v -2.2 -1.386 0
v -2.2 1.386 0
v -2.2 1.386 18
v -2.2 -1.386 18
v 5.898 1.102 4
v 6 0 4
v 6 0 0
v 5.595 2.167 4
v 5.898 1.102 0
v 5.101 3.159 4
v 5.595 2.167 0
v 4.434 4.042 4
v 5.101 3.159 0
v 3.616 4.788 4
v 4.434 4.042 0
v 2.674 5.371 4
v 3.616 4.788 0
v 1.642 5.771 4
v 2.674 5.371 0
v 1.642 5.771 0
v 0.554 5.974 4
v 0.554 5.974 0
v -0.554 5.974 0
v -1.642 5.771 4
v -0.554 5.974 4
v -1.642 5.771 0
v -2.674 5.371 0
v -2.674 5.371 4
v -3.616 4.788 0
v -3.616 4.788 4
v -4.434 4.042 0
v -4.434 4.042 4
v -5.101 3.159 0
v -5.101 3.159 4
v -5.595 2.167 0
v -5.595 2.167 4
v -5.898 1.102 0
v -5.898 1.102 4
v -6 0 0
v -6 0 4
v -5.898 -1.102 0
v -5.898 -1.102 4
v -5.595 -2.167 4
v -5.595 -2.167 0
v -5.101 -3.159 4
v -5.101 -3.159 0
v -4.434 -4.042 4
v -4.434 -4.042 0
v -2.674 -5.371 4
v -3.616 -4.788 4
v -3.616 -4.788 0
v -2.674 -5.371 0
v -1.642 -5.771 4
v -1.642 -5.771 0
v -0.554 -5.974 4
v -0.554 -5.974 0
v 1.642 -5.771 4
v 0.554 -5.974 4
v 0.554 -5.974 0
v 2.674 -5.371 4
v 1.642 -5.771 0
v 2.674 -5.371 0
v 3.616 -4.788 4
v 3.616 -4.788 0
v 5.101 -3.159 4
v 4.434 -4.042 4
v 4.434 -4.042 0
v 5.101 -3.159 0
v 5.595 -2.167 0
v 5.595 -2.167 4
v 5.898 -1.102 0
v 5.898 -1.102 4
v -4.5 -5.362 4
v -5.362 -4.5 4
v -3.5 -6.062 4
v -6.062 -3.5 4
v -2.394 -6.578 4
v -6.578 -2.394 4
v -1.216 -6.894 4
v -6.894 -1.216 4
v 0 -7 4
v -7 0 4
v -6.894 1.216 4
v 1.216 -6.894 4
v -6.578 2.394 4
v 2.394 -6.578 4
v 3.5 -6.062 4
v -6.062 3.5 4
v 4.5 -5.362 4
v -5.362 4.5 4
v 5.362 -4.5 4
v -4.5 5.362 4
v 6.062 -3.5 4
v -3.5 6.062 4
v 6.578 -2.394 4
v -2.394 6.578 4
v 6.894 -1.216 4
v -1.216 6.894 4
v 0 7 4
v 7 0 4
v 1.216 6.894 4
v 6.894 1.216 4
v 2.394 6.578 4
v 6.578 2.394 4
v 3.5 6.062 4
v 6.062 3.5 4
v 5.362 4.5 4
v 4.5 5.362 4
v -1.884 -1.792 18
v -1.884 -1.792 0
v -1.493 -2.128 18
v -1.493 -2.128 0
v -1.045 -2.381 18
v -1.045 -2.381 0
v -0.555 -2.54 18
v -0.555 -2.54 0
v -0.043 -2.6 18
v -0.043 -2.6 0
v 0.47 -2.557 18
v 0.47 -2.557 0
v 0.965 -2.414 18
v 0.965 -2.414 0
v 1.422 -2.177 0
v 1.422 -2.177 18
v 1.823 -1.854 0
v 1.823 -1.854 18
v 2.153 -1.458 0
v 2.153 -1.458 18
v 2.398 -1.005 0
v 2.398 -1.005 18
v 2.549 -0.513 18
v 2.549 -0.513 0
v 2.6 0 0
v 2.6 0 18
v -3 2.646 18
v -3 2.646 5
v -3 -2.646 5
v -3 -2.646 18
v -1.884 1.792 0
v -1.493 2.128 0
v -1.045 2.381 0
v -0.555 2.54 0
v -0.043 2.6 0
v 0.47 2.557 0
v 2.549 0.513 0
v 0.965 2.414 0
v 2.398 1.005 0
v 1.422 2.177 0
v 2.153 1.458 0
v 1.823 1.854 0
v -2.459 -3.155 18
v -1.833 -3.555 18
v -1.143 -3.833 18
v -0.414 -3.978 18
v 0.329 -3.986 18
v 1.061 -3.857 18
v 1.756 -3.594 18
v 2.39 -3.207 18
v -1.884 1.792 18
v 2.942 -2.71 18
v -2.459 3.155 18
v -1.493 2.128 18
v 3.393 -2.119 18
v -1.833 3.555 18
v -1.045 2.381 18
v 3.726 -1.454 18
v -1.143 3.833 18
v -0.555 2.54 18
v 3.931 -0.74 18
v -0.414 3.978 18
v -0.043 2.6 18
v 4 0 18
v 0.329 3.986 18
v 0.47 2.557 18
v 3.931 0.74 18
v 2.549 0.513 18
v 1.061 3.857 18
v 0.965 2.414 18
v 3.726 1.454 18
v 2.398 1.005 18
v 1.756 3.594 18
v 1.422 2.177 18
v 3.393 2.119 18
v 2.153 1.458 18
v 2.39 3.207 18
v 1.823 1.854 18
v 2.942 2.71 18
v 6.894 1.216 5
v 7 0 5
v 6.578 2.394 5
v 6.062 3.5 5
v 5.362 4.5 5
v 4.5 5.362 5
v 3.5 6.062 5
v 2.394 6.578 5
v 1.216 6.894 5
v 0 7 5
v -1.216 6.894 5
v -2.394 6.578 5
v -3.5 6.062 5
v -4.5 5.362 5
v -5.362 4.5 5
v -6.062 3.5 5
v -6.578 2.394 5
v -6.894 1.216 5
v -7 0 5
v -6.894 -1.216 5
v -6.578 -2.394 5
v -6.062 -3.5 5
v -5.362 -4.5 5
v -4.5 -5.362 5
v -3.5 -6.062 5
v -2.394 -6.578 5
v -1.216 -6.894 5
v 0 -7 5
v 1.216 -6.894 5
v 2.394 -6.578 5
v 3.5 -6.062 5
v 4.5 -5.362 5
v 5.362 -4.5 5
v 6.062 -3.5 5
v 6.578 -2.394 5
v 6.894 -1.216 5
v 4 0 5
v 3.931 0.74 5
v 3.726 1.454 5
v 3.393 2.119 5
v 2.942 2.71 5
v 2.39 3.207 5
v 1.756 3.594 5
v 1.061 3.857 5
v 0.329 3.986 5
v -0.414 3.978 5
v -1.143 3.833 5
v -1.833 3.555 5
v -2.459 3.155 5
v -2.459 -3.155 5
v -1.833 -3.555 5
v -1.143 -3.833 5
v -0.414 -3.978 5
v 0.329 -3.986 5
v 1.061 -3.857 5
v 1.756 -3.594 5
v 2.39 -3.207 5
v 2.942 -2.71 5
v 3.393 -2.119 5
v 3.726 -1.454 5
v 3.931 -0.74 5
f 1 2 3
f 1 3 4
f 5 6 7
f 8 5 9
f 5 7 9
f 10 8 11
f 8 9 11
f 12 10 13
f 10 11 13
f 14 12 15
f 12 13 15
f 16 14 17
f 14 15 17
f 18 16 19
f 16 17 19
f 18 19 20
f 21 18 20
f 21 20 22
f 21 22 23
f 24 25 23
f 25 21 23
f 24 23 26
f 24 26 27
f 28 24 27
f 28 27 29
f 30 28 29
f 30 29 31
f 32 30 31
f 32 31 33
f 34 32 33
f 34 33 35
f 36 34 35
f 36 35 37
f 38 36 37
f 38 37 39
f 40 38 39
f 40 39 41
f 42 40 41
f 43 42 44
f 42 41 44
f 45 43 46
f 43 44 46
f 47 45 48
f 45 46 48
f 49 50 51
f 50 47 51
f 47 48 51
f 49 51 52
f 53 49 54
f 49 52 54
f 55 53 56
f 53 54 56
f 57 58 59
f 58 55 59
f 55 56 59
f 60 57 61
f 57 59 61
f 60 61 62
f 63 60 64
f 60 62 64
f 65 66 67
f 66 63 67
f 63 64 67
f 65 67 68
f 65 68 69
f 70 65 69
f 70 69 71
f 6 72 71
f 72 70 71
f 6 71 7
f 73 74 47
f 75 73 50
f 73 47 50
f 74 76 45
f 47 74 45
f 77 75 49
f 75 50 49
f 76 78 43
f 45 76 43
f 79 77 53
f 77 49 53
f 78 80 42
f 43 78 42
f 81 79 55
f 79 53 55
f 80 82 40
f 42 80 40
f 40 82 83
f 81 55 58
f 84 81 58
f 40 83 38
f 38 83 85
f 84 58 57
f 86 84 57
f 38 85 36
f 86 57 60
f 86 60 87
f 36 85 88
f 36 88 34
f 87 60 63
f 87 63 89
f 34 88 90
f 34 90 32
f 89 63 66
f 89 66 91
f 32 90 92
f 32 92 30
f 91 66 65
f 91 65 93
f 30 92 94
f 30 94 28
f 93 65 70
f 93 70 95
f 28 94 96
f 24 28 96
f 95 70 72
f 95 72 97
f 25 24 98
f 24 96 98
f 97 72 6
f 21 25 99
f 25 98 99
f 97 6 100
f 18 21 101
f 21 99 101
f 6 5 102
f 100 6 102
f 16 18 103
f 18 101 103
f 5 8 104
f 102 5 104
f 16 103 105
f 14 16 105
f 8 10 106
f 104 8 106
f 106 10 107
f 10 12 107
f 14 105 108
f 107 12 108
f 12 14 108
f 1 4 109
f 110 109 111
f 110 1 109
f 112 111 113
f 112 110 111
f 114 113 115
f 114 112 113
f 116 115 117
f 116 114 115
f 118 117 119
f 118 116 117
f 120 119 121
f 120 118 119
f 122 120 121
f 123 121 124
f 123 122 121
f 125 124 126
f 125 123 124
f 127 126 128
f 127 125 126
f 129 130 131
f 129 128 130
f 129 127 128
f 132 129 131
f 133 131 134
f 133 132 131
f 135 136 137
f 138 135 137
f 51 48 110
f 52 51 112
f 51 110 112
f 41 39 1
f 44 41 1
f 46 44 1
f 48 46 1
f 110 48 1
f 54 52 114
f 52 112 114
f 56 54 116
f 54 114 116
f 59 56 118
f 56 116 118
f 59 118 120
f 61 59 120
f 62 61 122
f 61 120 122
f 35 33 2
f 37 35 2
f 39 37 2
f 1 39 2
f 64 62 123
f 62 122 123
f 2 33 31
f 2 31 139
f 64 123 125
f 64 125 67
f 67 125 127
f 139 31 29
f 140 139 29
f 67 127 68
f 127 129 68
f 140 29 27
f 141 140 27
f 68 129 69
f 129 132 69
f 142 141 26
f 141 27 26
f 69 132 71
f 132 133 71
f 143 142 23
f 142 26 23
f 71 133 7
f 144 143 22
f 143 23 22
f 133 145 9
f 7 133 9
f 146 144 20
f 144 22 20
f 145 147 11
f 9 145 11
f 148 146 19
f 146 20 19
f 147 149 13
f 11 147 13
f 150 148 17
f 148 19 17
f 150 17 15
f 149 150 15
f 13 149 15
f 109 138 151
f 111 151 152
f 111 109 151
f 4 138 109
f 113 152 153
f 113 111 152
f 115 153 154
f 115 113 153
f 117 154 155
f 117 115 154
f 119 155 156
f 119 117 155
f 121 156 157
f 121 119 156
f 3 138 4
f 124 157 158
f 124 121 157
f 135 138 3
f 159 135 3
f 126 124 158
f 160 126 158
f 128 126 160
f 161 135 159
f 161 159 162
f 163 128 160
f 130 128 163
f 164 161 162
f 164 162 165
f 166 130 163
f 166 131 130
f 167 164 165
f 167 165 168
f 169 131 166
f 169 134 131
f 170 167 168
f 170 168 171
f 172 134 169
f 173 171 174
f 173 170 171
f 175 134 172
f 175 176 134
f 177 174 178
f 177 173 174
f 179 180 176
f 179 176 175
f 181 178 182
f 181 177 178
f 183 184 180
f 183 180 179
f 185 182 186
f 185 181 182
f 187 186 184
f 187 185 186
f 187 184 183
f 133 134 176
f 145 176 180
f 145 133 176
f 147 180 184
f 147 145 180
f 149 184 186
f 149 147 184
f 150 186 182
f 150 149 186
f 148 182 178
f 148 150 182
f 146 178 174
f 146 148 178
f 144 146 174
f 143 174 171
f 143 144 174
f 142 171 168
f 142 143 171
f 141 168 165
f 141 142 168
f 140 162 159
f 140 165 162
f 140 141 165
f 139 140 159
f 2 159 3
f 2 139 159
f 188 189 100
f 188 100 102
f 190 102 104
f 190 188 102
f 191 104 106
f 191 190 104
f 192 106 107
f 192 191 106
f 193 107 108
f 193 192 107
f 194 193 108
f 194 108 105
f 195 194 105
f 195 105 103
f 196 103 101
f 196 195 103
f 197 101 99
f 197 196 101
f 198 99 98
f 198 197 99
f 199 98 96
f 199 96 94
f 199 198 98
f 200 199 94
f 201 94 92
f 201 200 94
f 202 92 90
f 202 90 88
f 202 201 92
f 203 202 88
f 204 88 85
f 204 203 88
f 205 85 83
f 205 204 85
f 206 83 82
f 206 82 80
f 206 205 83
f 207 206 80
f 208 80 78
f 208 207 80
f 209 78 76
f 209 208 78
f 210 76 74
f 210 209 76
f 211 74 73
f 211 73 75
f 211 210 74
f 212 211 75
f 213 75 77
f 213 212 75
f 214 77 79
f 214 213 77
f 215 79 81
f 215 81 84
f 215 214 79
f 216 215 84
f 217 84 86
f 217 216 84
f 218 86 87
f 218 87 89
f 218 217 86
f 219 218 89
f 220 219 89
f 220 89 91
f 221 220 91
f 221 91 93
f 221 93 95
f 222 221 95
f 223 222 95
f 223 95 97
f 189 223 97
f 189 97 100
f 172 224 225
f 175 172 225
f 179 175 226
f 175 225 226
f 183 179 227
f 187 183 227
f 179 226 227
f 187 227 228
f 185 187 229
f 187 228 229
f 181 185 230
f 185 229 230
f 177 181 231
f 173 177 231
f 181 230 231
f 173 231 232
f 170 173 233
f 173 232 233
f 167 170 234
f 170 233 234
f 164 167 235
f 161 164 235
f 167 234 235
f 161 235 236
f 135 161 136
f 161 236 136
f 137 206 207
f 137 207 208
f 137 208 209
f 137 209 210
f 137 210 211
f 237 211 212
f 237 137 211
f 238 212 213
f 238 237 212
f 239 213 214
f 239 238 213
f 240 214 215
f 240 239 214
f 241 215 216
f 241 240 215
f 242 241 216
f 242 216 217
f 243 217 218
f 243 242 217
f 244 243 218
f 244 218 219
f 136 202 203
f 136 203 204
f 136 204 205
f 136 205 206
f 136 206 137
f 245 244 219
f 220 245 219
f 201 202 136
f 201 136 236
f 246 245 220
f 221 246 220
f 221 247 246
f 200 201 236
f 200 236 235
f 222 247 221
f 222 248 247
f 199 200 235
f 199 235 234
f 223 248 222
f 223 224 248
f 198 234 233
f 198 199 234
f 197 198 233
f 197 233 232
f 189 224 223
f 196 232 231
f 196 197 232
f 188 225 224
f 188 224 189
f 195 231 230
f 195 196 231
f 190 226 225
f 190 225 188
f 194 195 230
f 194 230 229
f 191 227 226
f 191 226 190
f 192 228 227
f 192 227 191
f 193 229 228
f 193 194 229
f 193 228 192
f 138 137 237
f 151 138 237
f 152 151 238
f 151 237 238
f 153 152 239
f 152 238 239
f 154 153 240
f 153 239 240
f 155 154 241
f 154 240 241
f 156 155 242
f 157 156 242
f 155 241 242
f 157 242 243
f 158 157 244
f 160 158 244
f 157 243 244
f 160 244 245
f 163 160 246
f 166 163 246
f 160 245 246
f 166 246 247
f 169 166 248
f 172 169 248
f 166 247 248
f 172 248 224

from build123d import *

# Parameters (mm, degrees)
SKETCH_1_R          = 6
EXTRUDE_1_DEPTH     = 5
SKETCH_7_R          = 7
EXTRUDE_6_DEPTH     = 1
EXTRUDE_2_DEPTH     = 13
CUT_EXTRUDE_1_DEPTH = 19


with BuildPart() as part:
    # 草图1 → 凸台-拉伸1 (new body)
    with BuildSketch(Plane.XY):
        Circle(SKETCH_1_R)
    extrude(amount=EXTRUDE_1_DEPTH)

    # 草图7 → 凸台-拉伸6 (add)
    with BuildSketch(Plane.XY.offset(5)):
        Circle(SKETCH_7_R)
    extrude(amount=-EXTRUDE_6_DEPTH)

    # 草图2 → 凸台-拉伸2 (add)
    with BuildSketch(Plane.XY.offset(5)):
        with BuildLine():
            ThreePointArc((4, 0), (1.414213562, 3.741657387), (-3, 2.645751311))
            Line((-3, 2.645751311), (-3, -2.645751311))
            ThreePointArc((-3, -2.645751311), (1.414213562, -3.741657387), (4, 0))
        make_face()
    extrude(amount=EXTRUDE_2_DEPTH)

    # 草图8 → 切除-拉伸1 (cut, through all)
    with BuildSketch(Plane.XY):
        with BuildLine():
            ThreePointArc((2.6, 0), (0.721110255, 2.497999199), (-2.2, 1.385640646))
            Line((-2.2, 1.385640646), (-2.2, -1.385640646))
            ThreePointArc((-2.2, -1.385640646), (0.721110255, -2.497999199), (2.6, 0))
        make_face()
    extrude(amount=CUT_EXTRUDE_1_DEPTH, mode=Mode.SUBTRACT)


solid = part.part
